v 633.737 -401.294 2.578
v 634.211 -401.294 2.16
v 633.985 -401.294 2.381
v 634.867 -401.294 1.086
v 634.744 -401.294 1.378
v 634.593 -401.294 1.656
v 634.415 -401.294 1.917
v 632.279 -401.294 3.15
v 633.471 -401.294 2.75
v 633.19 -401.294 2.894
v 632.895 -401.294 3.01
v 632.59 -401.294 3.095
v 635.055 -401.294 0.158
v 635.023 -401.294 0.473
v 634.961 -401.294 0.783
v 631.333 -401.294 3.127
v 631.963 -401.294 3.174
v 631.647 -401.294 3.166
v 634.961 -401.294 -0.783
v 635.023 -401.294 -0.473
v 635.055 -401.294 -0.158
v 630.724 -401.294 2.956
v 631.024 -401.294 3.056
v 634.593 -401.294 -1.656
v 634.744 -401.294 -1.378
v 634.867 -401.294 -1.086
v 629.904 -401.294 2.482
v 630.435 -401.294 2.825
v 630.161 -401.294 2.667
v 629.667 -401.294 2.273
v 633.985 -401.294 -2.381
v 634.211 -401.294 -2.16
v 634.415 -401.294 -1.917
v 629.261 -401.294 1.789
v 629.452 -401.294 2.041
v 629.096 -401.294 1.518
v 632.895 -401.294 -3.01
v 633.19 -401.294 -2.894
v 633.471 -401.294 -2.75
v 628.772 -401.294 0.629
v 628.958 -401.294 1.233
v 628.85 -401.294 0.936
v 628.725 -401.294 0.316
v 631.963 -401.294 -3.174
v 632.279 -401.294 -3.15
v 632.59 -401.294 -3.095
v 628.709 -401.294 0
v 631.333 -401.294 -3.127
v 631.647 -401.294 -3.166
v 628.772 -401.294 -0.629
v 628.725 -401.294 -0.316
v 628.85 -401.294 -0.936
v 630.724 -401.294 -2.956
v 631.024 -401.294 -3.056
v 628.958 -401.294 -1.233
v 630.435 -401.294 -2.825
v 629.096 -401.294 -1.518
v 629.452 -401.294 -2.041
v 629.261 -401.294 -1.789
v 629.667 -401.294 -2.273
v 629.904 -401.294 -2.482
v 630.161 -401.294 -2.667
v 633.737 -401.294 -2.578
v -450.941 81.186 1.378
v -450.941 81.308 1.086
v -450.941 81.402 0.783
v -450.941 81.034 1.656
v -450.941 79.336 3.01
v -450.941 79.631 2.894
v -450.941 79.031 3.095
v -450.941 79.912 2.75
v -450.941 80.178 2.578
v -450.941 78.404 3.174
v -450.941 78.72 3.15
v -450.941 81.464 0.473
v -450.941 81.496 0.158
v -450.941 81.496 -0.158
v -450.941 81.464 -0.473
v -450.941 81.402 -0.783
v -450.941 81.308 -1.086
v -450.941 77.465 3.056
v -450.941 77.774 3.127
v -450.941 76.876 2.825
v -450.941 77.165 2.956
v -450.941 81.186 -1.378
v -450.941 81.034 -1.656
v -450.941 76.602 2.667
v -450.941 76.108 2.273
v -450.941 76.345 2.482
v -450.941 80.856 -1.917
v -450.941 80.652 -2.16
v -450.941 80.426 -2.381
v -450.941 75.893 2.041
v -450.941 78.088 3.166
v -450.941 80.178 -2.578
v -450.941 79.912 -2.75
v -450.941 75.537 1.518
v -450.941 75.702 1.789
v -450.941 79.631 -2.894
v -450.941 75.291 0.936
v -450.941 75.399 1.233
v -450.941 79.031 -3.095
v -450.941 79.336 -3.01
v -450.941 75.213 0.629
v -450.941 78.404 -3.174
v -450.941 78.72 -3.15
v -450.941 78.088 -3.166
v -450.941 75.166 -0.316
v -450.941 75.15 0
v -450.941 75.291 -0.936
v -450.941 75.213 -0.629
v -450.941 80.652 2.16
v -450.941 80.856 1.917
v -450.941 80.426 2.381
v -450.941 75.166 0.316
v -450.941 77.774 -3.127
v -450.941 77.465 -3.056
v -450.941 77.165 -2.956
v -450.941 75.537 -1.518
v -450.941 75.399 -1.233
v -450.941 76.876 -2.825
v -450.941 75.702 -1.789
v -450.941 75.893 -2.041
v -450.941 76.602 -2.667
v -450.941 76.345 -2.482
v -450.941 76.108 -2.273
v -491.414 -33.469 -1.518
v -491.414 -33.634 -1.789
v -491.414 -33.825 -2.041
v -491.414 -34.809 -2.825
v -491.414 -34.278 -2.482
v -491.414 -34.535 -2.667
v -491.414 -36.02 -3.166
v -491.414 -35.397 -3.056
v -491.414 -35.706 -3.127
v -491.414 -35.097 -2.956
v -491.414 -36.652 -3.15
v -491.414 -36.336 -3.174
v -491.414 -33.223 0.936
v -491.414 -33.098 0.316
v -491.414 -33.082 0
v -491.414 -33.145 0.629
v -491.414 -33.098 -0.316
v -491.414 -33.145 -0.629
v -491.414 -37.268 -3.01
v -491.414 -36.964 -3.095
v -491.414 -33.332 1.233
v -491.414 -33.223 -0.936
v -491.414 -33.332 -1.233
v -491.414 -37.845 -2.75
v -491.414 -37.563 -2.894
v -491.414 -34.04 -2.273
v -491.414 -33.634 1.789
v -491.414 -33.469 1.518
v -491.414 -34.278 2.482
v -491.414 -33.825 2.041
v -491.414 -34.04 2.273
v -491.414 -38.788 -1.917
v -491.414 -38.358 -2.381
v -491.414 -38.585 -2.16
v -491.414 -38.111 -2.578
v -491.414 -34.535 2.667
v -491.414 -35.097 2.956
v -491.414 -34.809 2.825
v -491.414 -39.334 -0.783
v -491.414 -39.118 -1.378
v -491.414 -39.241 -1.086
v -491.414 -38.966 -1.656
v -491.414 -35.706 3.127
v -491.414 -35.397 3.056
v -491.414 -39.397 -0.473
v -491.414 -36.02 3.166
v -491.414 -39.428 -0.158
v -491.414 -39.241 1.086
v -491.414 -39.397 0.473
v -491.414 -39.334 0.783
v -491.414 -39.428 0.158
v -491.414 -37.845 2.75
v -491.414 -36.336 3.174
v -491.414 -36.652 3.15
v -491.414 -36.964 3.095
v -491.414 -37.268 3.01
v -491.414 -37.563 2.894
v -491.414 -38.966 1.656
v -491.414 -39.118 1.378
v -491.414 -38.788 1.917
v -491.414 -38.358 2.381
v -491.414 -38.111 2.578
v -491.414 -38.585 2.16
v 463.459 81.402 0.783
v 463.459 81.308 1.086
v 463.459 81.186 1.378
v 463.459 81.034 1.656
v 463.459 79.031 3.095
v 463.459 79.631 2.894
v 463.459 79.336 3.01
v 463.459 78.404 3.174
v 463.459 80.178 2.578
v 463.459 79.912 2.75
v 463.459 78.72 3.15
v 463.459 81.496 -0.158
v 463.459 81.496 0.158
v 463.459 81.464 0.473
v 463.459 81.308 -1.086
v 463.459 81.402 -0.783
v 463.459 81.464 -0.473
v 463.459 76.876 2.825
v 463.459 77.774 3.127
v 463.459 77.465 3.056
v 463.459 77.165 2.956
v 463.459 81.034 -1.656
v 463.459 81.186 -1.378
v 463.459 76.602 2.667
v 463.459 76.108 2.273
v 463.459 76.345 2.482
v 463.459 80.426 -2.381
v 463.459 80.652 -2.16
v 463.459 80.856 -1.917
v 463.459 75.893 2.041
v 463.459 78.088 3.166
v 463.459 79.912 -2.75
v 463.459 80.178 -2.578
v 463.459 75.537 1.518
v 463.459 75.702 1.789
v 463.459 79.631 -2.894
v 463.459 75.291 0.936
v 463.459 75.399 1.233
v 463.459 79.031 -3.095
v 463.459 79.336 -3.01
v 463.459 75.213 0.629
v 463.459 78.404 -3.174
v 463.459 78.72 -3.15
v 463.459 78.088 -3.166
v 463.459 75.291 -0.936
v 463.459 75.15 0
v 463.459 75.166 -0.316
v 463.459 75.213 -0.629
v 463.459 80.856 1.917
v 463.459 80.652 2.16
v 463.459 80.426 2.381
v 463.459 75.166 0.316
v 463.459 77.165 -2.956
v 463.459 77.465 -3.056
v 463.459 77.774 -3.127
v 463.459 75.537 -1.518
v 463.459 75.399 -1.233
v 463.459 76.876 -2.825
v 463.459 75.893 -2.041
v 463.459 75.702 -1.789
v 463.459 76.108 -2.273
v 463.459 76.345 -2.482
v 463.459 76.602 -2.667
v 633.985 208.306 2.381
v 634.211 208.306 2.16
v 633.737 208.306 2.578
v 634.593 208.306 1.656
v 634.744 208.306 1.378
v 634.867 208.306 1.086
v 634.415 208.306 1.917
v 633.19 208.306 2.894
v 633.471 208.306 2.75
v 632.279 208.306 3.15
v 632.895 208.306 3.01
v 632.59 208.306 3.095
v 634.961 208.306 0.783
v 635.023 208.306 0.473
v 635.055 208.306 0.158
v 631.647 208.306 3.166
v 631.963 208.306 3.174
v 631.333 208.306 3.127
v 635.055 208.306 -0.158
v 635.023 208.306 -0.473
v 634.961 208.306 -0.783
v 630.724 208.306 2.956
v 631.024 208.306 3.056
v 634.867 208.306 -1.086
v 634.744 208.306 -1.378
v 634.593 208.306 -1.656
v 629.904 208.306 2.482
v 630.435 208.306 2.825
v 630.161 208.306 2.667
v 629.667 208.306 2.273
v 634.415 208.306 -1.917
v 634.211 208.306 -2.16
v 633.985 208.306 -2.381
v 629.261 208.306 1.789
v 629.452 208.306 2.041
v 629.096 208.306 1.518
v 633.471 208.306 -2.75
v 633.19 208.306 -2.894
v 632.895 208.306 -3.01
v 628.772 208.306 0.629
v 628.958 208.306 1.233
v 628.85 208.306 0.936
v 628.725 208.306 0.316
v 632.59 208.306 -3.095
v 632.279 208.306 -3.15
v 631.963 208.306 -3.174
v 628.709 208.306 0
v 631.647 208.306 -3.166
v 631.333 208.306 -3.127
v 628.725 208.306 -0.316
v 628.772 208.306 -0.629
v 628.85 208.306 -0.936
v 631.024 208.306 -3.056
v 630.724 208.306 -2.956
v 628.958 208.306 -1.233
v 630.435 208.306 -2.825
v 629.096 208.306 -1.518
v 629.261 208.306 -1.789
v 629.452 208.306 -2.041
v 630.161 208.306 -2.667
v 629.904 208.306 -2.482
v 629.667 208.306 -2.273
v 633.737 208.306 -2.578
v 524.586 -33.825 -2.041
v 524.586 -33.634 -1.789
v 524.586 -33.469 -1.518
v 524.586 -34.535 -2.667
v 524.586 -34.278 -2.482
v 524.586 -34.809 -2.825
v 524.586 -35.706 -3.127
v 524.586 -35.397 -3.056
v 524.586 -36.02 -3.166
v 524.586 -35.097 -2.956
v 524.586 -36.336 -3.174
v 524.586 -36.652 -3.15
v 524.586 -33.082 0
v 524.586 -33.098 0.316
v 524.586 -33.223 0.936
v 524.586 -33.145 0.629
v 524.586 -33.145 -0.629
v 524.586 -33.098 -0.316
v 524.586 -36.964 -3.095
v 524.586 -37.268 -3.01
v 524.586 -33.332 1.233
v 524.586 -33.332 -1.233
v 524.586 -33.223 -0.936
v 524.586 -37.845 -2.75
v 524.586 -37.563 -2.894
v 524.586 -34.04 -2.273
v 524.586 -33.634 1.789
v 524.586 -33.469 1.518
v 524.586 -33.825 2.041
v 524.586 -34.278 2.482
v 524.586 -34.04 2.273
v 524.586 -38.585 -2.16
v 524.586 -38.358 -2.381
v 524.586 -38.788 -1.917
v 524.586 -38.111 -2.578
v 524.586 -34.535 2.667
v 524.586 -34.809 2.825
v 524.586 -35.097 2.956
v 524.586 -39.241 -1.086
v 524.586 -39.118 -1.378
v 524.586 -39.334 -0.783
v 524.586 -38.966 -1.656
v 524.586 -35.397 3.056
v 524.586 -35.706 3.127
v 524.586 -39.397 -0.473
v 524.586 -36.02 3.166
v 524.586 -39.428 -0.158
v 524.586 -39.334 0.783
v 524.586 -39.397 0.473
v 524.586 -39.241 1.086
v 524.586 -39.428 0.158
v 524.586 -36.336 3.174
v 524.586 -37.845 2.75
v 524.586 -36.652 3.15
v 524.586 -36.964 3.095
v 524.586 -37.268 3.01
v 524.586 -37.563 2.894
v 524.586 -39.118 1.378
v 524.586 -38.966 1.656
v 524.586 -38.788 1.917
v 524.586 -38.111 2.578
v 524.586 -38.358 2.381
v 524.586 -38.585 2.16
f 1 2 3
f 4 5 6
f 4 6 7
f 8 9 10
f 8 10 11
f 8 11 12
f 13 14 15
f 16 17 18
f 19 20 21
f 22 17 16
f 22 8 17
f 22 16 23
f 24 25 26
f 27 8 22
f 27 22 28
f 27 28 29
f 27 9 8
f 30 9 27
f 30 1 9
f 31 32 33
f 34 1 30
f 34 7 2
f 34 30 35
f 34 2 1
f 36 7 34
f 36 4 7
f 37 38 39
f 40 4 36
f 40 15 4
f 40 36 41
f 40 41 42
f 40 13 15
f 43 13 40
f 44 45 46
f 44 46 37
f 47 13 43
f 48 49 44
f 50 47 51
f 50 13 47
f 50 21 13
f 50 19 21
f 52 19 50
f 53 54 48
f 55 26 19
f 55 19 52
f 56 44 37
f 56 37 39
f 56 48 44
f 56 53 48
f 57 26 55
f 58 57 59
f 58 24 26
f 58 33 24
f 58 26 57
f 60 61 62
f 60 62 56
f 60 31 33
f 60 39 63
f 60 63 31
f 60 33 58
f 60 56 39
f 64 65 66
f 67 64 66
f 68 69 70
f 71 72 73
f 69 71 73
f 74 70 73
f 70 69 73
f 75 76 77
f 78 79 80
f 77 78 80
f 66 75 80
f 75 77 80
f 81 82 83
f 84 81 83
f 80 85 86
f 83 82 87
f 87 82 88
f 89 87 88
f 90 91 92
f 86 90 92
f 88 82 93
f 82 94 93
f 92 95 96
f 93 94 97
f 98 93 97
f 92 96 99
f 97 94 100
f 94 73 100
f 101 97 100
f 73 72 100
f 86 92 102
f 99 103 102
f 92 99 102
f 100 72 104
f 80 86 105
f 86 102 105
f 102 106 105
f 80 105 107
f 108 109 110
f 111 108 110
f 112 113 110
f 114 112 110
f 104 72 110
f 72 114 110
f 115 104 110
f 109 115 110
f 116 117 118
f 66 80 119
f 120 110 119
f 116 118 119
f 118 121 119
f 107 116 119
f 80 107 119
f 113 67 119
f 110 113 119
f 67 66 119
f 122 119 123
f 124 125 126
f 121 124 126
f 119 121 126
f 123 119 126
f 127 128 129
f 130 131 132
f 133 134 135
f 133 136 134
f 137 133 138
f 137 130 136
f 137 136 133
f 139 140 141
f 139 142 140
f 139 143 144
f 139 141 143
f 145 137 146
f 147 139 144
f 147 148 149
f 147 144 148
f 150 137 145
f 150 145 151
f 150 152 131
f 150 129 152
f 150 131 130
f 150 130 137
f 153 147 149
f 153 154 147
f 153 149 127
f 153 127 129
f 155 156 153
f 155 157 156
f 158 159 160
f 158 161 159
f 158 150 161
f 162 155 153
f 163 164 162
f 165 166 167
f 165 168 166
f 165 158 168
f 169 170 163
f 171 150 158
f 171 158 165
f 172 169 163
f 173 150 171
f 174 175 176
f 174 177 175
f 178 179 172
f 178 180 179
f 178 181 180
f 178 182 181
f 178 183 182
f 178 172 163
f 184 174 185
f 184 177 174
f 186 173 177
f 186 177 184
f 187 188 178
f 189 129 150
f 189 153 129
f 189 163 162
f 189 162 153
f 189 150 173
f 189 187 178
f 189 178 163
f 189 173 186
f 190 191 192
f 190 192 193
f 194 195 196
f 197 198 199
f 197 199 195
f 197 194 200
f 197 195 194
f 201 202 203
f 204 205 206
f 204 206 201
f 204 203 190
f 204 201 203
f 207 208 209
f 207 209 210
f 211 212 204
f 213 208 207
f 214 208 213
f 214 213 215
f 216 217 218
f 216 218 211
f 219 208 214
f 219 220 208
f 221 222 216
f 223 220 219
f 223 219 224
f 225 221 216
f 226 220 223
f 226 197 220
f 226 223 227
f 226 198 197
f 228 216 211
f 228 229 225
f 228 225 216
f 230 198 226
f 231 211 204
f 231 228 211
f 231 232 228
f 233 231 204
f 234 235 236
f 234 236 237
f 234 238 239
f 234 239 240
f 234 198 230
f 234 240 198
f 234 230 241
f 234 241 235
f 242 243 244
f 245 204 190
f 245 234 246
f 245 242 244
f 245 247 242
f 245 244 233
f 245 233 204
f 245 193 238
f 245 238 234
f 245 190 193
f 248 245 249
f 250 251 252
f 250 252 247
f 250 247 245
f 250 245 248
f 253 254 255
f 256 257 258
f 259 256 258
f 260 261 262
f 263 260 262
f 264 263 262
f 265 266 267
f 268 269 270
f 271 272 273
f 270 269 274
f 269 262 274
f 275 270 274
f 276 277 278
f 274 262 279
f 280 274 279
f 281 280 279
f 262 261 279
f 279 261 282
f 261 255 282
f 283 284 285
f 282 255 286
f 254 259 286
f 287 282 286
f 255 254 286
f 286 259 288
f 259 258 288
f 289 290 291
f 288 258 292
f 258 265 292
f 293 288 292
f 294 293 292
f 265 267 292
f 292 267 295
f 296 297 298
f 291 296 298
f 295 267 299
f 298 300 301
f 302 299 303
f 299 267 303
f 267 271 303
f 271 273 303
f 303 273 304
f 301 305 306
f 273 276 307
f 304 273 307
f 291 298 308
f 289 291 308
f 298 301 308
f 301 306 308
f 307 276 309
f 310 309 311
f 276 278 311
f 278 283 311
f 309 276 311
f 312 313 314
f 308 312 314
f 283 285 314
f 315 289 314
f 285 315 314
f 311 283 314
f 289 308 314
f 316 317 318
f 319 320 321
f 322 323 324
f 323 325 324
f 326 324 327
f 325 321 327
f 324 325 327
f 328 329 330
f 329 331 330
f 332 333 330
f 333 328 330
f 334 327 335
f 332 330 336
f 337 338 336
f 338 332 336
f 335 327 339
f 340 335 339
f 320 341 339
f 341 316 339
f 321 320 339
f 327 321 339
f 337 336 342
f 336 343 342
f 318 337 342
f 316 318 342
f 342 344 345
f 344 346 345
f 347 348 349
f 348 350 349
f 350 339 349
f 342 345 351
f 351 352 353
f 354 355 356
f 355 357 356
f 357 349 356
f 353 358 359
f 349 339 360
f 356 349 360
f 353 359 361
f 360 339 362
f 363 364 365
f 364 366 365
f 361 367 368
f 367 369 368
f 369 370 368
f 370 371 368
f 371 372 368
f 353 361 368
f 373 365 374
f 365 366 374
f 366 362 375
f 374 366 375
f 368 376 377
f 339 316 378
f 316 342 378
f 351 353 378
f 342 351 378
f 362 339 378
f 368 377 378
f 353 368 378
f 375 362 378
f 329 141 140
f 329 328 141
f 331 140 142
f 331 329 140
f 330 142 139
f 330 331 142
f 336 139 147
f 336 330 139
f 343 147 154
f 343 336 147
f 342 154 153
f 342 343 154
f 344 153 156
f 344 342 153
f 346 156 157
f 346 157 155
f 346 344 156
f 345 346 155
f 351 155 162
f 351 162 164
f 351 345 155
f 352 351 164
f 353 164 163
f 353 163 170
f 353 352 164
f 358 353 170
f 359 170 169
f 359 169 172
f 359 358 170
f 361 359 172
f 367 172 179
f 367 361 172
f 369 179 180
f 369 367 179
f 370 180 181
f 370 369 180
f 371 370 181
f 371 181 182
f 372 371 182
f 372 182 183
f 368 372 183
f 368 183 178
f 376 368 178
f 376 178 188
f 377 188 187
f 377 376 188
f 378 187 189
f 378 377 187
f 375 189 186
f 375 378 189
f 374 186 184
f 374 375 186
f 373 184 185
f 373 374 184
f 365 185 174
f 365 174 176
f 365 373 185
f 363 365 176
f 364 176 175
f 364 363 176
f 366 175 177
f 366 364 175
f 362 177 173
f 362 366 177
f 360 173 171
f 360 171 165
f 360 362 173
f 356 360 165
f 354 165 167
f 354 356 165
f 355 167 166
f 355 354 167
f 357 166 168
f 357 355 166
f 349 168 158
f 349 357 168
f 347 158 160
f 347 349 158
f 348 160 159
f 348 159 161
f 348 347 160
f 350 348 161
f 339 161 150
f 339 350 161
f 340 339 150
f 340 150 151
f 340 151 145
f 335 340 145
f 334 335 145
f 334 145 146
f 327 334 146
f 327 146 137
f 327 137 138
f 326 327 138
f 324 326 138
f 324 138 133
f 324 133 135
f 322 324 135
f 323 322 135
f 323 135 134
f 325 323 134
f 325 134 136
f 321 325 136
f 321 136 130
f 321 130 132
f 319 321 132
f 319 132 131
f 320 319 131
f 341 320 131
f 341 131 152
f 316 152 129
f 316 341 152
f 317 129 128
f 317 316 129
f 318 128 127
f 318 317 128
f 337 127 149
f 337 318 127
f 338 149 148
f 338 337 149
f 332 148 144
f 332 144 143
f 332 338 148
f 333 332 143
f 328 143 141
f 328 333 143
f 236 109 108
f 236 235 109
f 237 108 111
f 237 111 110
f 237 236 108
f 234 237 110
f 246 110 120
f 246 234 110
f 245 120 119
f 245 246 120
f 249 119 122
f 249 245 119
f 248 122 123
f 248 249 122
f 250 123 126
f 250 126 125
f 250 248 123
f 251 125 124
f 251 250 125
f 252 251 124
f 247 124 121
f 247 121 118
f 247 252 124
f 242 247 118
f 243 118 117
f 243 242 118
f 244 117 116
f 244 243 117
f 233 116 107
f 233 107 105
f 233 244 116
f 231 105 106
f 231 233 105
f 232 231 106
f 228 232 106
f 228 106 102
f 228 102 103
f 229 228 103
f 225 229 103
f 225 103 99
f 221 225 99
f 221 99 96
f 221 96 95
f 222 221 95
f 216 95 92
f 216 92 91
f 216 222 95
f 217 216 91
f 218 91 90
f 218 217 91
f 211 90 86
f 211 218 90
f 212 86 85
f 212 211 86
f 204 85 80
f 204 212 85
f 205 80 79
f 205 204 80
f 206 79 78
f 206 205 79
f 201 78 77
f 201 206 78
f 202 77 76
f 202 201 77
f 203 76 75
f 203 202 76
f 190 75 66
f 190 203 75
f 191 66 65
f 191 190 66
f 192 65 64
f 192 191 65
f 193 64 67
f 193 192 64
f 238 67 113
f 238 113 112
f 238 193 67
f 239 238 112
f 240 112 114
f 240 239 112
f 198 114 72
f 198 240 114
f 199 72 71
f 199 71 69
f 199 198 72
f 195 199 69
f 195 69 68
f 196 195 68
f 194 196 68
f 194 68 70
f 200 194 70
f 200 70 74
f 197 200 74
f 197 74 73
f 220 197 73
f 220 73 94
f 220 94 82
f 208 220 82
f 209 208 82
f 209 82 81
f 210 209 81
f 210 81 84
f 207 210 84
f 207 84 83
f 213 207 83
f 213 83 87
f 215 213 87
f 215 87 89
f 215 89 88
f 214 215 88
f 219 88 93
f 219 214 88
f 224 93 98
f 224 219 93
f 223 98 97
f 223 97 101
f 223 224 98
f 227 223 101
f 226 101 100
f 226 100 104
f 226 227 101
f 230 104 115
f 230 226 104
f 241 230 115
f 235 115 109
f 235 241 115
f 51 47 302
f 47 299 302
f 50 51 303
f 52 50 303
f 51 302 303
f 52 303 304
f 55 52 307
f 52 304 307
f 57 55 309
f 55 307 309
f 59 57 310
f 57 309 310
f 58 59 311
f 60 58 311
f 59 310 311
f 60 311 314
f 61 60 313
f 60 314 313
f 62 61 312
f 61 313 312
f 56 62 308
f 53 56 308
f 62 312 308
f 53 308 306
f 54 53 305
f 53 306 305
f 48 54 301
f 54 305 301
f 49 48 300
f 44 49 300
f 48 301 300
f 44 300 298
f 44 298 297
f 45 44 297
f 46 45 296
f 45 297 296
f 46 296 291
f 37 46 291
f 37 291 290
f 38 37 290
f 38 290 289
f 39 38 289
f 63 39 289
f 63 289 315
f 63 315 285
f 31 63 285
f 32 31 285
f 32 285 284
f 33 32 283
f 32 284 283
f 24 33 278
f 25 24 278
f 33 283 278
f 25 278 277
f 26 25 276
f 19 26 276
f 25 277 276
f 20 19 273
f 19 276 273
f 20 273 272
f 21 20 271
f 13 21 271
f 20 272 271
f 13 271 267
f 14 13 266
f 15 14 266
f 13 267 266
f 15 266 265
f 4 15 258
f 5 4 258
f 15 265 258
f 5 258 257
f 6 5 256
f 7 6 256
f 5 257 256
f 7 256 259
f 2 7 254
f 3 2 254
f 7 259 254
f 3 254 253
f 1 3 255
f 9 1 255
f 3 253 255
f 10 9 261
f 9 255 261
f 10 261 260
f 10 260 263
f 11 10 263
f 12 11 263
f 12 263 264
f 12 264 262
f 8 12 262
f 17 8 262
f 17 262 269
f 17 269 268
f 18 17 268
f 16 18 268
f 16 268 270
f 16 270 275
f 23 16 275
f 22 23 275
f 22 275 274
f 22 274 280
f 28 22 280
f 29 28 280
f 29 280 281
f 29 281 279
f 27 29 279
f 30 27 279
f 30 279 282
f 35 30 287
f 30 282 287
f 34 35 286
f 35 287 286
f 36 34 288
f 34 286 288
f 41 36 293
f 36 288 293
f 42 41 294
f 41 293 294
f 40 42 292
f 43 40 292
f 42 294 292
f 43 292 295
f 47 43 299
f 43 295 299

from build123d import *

# Parameters (mm, degrees)
F0_W = 1016
F0_H = 3.175
F2_W = 914.4
F2_H = 3.175
F3_W = 812.8
F3_H = 3.175
F4_W = 762
F4_H = 3.175
F8_W = 3.175
F8_H = 609.6
F9_W = 3.175
F9_H = 914.4


with BuildPart() as f1:
    # F0 (on Top) → F1 (revolve)
    with BuildSketch(Plane.XY):
        with Locations((16.585609, -34.669704)):
            Rectangle(F0_W, F0_H)
    revolve(axis=Axis((16.585609, -36.257204, 0), (1, 0, 0)))


with BuildPart() as f5:
    # F2 (on Top) → F5 (revolve)
    with BuildSketch(Plane.XY):
        with Locations((6.258547, 76.737433)):
            Rectangle(F2_W, F2_H)
    revolve(axis=Axis((6.258547, 78.324933, 0), (1, 0, 0)))


with BuildPart() as f6:
    # F3 (on Top) → F6 (revolve)
    with BuildSketch(Plane.XY):
        with Locations((99.952236, 135.788546)):
            Rectangle(F3_W, F3_H)
    revolve(axis=Axis((99.952236, 137.376046, 0), (1, 0, 0)))


with BuildPart() as f7:
    # F4 (on Top) → F7 (revolve)
    with BuildSketch(Plane.XY):
        with Locations((124.057755, 176.901974)):
            Rectangle(F4_W, F4_H)
    revolve(axis=Axis((124.057755, 178.489474, 0), (1, 0, 0)))


with BuildPart() as f10:
    # F8 (on Top) → F10 (revolve)
    with BuildSketch(Plane.XY):
        with Locations((630.296361, -96.494183)):
            Rectangle(F8_W, F8_H)
    revolve(axis=Axis((631.883861, -96.494183, 0), (0, -1, 0)))


with BuildPart() as f11:
    # F9 (on Top) → F11 (revolve)
    with BuildSketch(Plane.XY):
        with Locations((711.808065, -68.618268)):
            Rectangle(F9_W, F9_H)
    revolve(axis=Axis((713.395565, -68.618268, 0), (0, -1, 0)))


solid = Compound([f1.part, f5.part, f10.part])
